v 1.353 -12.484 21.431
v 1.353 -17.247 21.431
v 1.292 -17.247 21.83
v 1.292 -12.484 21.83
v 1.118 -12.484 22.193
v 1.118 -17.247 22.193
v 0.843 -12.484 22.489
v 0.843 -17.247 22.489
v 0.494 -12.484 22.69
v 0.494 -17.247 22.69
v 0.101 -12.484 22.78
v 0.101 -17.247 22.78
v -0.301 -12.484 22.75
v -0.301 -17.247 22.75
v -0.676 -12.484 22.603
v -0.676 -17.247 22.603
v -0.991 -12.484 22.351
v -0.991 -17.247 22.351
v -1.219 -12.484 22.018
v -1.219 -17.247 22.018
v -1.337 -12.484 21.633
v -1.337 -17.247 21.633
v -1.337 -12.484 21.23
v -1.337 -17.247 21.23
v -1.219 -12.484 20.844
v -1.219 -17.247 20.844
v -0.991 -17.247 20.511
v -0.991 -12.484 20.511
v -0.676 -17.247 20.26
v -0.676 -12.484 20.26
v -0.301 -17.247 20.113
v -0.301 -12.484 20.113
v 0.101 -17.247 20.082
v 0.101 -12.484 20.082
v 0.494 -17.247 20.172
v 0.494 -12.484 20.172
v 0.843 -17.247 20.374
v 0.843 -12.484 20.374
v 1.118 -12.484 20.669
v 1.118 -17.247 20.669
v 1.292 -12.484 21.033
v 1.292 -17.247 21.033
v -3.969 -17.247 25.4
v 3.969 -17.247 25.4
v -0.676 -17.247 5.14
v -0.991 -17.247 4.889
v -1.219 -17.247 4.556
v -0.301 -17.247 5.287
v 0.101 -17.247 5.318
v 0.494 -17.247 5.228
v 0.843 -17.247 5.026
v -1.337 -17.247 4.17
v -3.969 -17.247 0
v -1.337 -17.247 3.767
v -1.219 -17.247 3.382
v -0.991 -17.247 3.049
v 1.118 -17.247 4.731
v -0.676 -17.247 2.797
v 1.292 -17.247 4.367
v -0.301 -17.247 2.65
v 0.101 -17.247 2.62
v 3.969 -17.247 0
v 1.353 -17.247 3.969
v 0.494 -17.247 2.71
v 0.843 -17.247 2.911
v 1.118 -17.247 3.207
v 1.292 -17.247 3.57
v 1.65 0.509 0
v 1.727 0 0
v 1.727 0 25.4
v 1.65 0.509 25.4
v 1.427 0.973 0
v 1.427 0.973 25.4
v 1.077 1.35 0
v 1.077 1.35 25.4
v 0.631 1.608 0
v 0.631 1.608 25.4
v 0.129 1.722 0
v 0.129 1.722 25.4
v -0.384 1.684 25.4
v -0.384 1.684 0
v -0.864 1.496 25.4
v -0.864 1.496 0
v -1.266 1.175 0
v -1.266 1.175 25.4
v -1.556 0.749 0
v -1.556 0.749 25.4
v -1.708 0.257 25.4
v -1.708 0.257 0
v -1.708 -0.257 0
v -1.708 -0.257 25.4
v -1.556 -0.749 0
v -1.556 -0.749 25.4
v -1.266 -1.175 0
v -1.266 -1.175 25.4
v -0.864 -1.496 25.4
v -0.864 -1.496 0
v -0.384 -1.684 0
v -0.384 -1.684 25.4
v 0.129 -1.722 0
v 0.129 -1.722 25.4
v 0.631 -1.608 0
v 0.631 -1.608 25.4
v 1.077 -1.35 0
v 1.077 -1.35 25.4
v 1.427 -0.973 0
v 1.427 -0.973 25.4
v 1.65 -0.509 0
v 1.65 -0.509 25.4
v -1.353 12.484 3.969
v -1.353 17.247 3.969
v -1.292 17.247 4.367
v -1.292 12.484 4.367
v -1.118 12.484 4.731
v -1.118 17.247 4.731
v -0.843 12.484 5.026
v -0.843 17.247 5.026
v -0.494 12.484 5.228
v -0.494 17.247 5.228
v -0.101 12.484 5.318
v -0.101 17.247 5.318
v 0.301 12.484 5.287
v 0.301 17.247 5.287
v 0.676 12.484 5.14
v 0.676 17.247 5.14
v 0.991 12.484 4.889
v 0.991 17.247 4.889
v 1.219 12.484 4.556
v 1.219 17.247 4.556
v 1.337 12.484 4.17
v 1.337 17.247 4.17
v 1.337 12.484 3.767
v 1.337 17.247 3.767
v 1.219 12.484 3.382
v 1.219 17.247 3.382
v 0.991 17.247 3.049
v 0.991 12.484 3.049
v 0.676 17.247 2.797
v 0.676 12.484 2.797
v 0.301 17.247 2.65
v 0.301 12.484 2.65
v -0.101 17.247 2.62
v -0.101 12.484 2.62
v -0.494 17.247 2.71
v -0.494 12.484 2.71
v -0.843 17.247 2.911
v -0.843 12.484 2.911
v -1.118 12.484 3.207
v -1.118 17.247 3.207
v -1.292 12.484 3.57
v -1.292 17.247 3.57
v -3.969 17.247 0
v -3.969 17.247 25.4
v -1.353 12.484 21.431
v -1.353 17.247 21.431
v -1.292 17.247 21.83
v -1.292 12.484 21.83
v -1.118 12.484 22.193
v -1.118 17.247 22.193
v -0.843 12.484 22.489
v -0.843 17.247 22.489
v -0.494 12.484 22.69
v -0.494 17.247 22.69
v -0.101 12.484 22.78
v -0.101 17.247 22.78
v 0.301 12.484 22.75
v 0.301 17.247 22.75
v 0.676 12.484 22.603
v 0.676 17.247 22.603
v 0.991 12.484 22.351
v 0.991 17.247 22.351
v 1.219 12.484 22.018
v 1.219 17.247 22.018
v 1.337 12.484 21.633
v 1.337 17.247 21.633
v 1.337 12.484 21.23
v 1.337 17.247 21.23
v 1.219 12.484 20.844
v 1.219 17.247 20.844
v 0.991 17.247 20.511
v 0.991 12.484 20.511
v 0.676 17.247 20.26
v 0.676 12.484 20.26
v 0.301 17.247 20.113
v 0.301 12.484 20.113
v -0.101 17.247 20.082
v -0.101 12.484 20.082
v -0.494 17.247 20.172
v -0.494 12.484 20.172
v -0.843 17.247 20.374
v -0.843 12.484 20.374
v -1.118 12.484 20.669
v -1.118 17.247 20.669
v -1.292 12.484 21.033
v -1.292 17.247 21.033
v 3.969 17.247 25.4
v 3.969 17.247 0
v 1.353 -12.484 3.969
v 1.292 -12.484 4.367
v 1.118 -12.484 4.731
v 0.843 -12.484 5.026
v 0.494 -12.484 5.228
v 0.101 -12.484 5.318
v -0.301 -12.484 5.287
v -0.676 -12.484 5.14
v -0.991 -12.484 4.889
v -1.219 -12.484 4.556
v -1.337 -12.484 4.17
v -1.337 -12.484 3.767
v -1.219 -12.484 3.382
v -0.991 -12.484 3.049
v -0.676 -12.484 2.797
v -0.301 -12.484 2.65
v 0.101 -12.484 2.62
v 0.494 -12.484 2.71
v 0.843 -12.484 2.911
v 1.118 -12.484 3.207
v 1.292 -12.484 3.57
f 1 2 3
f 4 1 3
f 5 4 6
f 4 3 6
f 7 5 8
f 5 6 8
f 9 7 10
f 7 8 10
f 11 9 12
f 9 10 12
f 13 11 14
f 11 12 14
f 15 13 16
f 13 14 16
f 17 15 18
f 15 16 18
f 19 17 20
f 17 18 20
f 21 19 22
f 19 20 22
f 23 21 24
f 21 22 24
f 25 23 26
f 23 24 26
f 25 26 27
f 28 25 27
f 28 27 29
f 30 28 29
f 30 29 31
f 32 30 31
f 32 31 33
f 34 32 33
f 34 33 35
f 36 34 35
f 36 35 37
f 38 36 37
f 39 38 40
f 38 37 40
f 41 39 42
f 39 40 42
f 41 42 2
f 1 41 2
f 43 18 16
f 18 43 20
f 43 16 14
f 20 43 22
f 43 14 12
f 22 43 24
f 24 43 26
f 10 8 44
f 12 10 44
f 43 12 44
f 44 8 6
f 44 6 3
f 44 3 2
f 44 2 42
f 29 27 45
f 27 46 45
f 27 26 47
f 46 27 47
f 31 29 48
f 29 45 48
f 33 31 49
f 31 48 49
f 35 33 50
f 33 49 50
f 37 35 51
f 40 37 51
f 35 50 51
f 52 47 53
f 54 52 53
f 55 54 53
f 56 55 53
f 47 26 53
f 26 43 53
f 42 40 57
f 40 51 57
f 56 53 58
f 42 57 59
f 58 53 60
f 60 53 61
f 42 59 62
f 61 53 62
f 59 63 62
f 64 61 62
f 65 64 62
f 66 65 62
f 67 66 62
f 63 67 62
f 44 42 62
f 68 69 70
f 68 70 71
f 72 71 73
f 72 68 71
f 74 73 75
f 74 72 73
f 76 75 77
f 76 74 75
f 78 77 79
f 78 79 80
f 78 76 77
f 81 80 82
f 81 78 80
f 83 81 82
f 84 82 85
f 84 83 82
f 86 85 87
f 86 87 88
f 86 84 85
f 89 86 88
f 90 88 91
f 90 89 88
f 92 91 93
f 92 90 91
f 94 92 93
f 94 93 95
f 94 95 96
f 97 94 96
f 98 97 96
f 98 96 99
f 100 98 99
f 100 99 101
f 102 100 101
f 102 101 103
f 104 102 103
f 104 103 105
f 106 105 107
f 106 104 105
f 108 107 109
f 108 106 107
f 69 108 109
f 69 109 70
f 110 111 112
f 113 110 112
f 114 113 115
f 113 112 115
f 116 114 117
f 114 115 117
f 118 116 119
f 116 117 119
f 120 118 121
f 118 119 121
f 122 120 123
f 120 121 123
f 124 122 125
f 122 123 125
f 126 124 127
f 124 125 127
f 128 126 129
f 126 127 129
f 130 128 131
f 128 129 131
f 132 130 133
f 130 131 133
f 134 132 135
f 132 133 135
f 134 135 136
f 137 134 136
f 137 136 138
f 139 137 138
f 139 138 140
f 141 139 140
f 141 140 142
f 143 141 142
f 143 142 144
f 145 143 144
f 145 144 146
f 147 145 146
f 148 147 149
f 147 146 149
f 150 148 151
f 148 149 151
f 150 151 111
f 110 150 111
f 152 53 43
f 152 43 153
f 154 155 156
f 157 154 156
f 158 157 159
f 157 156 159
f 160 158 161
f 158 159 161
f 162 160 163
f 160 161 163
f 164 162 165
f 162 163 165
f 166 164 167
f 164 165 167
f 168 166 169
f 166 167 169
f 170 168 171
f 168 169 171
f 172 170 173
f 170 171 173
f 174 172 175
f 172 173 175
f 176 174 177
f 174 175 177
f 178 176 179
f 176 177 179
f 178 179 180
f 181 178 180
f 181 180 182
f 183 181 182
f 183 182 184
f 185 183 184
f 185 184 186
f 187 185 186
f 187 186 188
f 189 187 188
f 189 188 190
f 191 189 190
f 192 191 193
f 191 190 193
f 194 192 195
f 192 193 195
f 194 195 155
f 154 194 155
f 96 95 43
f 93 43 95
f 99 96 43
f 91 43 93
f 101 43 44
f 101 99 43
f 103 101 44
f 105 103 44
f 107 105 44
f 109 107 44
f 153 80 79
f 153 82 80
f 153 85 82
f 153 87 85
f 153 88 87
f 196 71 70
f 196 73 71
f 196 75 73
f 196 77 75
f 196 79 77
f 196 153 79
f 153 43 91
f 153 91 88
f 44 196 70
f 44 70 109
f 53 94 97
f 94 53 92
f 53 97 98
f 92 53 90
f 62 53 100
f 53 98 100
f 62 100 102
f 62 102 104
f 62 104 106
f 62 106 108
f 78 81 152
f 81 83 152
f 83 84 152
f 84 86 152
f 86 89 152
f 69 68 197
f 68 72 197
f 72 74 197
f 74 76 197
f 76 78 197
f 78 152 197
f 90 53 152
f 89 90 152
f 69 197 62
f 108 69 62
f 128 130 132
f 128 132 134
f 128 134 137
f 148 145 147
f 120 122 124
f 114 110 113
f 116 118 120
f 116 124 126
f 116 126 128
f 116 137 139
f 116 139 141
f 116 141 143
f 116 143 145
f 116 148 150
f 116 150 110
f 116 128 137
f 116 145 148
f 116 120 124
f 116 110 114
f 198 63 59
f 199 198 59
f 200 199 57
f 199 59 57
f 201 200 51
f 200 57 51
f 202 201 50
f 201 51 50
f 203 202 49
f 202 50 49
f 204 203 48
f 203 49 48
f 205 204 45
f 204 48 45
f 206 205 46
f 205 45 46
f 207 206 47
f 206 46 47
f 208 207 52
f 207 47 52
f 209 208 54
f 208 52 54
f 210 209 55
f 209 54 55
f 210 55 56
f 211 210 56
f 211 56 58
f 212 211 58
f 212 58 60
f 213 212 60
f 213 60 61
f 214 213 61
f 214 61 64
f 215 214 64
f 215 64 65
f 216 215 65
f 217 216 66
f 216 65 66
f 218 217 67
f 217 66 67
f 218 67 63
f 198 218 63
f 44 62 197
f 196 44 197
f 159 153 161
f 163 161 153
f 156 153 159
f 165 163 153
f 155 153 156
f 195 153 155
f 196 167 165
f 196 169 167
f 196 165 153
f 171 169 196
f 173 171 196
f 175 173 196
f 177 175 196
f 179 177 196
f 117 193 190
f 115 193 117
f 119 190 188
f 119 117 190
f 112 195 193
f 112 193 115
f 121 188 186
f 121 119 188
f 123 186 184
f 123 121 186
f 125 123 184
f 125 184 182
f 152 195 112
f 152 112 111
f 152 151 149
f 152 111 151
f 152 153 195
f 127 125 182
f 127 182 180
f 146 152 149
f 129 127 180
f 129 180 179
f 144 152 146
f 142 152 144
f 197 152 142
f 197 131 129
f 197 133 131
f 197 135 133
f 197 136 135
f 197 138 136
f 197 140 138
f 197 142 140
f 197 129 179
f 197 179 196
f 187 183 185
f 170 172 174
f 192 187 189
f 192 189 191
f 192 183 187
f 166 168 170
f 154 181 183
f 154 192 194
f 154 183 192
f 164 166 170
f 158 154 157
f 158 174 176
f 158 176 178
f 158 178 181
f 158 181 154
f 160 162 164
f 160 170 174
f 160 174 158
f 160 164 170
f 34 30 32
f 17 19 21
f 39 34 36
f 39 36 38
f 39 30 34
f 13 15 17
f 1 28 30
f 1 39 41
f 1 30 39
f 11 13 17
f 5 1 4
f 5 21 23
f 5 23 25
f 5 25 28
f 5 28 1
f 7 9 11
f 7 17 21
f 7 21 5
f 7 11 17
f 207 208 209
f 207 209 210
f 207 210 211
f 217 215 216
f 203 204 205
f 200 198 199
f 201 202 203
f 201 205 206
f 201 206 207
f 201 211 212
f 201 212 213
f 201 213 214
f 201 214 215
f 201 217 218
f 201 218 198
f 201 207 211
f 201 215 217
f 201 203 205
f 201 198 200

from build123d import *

# Parameters (mm, degrees)
F0_W     = 7.9375
F0_H     = 34.493074
F0_R     = 1.7272
F1_DEPTH = 25.4
F2_R     = 1.35255
F3_DEPTH = 4.7625
F4_R     = 1.35255
F5_DEPTH = 4.7625


with BuildPart() as f1:
    # F0 (on Top) → F1 (new body)
    with BuildSketch(Plane.XY):
        Rectangle(F0_W, F0_H)
        Circle(F0_R, mode=Mode.SUBTRACT)
    extrude(amount=F1_DEPTH)

    # F2 (on face) → F3 (cut)
    with BuildSketch(Plane(origin=(0, 17.246537, 0), x_dir=(-1, 0, 0), z_dir=(0, 1, 0))):
        with Locations((0, 3.96875)):
            Circle(F2_R)
        with Locations((0, 21.43125)):
            Circle(F2_R)
    extrude(amount=-F3_DEPTH, mode=Mode.SUBTRACT)

    # F4 (on face) → F5 (cut)
    with BuildSketch(Plane.XZ.offset(17.246537)):
        with Locations((0, 21.43125)):
            Circle(F4_R)
        with Locations((0, 3.96875)):
            Circle(F4_R)
    extrude(amount=-F5_DEPTH, mode=Mode.SUBTRACT)


solid = f1.part
